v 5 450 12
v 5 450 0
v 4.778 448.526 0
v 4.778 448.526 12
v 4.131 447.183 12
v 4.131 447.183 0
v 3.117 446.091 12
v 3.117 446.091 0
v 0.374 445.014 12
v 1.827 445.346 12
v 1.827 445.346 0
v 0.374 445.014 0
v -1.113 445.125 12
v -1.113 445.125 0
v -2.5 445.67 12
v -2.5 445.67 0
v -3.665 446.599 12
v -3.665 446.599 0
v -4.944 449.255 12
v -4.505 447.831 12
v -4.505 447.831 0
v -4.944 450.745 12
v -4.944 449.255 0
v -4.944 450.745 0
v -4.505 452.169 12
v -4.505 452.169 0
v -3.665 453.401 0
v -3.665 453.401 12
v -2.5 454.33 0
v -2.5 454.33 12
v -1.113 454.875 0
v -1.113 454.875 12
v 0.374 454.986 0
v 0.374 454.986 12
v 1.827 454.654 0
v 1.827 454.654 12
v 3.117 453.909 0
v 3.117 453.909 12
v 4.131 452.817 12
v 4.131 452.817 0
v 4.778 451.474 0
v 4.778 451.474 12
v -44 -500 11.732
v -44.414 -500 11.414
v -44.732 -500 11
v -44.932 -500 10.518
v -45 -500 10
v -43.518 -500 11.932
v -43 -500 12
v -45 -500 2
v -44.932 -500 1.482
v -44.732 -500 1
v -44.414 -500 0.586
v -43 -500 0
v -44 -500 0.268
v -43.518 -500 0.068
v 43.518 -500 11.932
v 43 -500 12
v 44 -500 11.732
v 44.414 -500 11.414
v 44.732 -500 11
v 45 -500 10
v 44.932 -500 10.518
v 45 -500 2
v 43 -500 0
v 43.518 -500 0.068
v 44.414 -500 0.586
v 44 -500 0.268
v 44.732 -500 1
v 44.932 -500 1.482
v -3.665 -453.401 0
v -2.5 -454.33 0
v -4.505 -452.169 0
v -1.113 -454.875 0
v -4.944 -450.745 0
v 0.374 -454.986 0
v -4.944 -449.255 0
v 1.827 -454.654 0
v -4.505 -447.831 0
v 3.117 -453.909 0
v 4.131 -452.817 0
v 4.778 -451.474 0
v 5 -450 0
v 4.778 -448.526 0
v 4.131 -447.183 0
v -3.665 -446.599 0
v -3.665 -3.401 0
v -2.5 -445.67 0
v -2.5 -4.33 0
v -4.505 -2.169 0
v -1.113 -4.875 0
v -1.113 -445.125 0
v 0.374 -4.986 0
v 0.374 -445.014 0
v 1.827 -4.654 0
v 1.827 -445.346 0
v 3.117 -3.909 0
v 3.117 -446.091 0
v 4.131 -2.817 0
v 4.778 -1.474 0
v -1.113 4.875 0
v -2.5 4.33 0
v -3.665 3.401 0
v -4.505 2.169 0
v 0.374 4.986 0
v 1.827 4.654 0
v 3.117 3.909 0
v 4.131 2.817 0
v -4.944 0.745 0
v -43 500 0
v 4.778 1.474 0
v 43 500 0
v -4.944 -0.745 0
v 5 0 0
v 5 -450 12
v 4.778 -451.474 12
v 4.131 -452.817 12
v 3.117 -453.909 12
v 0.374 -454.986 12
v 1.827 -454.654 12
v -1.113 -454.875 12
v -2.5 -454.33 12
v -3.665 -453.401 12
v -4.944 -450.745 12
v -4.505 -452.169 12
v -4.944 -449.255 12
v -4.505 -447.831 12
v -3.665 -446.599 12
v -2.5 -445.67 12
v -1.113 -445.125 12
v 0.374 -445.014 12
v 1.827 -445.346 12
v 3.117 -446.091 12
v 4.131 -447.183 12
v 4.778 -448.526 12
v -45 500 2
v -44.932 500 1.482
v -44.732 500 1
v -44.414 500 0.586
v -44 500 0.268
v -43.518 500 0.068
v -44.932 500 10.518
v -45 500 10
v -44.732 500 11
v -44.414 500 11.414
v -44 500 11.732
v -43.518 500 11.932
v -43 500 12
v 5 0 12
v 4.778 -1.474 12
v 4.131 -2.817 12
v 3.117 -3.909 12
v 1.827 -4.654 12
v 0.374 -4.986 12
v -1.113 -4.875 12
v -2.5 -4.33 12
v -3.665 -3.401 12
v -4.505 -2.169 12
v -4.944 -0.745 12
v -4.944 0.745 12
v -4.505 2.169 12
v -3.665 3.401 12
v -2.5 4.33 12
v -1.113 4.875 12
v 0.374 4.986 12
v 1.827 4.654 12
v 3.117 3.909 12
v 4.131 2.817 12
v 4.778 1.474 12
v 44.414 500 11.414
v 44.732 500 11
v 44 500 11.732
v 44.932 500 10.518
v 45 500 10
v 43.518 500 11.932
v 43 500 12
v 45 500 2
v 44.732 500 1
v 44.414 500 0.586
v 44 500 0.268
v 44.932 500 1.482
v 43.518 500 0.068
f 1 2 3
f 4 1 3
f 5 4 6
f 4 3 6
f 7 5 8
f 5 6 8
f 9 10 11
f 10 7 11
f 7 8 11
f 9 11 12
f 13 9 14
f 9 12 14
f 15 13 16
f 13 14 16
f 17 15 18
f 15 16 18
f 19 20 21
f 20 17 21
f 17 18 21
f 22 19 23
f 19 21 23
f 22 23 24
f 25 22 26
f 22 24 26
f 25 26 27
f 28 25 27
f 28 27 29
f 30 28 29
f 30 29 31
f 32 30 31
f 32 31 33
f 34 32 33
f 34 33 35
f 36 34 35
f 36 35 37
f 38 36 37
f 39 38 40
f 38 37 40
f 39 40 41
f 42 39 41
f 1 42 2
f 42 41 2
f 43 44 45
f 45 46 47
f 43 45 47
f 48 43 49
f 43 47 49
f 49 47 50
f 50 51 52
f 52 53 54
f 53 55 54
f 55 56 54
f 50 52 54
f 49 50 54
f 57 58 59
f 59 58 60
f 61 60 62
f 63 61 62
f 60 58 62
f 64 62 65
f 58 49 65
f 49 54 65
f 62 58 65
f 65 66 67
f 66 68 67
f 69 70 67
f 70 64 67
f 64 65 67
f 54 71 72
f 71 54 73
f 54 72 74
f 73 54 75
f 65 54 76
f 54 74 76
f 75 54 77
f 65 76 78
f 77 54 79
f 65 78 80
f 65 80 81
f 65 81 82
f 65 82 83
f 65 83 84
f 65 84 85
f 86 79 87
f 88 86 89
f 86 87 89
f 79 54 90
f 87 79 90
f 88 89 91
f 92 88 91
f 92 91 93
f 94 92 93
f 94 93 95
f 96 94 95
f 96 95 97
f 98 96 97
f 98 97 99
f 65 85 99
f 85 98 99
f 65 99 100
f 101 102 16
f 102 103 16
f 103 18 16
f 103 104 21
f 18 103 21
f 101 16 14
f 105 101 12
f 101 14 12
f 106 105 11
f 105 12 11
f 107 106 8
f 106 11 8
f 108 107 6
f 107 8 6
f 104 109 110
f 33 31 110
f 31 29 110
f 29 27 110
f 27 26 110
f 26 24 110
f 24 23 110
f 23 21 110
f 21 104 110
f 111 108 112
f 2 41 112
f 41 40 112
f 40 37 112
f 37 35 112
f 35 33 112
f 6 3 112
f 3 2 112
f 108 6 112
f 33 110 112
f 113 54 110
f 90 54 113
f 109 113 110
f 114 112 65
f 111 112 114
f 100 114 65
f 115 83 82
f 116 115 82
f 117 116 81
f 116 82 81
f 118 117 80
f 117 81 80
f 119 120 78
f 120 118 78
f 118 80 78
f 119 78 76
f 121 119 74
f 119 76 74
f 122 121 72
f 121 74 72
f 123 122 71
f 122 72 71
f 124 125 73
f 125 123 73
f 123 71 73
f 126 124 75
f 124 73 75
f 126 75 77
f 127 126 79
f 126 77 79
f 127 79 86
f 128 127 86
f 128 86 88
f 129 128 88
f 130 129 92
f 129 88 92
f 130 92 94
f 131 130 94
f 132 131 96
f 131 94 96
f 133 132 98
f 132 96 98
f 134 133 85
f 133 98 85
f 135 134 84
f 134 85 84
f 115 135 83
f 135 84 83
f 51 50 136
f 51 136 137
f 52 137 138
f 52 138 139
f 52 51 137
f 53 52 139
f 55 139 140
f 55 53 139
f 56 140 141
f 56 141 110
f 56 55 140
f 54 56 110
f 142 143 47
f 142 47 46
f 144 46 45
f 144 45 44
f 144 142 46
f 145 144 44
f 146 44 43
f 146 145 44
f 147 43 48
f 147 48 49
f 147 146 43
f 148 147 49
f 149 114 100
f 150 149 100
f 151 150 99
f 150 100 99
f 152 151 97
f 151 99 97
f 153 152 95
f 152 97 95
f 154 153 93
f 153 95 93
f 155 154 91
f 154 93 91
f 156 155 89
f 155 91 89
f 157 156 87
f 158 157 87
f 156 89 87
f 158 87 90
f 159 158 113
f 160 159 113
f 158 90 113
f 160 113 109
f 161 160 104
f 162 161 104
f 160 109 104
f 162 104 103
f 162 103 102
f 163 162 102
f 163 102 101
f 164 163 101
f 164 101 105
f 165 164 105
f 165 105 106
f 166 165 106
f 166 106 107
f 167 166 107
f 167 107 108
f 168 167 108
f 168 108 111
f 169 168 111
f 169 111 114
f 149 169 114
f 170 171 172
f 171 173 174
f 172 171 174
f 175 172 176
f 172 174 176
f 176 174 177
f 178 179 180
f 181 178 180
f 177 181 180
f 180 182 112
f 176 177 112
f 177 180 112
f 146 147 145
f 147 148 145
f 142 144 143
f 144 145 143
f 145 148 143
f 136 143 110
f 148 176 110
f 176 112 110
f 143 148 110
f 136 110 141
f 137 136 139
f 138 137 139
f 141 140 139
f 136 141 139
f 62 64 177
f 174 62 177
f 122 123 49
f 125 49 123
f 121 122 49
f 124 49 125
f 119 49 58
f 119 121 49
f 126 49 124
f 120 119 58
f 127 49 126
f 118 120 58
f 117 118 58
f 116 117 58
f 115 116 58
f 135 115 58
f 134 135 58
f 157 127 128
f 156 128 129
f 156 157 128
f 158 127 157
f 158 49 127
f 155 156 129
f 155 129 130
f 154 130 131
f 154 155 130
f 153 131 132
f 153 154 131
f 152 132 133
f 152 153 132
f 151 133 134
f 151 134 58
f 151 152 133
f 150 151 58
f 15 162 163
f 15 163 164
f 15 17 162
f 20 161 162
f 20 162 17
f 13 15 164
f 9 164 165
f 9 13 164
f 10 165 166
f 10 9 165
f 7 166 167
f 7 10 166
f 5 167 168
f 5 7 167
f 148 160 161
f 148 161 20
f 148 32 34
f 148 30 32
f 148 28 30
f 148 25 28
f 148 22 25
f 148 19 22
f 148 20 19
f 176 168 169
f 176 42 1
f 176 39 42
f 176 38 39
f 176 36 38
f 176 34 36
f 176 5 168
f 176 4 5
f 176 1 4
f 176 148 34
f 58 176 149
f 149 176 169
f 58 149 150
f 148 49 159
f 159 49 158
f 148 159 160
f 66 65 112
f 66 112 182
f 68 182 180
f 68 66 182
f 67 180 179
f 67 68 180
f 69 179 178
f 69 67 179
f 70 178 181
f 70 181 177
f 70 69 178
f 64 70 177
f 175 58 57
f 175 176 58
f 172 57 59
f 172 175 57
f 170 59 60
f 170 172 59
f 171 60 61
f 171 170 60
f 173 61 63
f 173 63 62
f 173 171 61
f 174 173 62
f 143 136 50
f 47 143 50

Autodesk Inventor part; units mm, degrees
ref_plane "YZ Plane" through (0, 0, 0) normal (1, 0, 0) x (0, 1, 0)
ref_plane "XZ Plane" through (0, 0, 0) normal (0, 1, 0) x (-1, 0, 0)
ref_plane "Work Plane1" through (0, 0, 0) normal (0, 0, 1) x (1, 0, 0)
sketch "Sketch1" plane through (0, 0, 0) normal (0, 0, 1) x (1, 0, 0)
  line L0 (-45, -500) -> (45, -500)
  line L1 (45, -500) -> (45, 500)
  line L2 (45, 500) -> (-45, 500)
  line L3 (-45, 500) -> (-45, -500)
  line L4 (-385, 0) -> (385, 0) projected
  line L5 (0, -500) -> (0, 500) construction
  circle A0 centre (0, 0) radius 5
  circle A1 centre (0, -450) radius 5
  circle A2 centre (0, 450) radius 5
  circle A3 centre (240, -0.5) radius 5 construction
  circle A4 centre (120, -0.5) radius 5 construction
  circle A5 centre (-120, -0.5) radius 5 construction
  circle A6 centre (-240, -0.5) radius 5 construction
  circle A7 centre (0, -0.5) radius 5 construction
  line L6 (-275, -23) -> (275, -23) construction
  line L7 (275, 23) -> (275, -23) construction
  line L8 (275, 23) -> (-275, 23) construction
  line L9 (-275, -23) -> (-275, 23) construction
  point P0 (0, 0)
  point P1 (-45, 0)
  dimension "d0" = 90
  dimension "d1" = 1000
  dimension "d2" = 10
  dimension "d3" = 10
  dimension "d4" = 10
  dimension "d5" = 450
  dimension "d6" = 450
extrude "Extrusion1" add sketch "Sketch1" along normal blind 12 contours L3 L4 A0 L1 L0 | L3 L2 L1 L4 A0
fillet "Fillet1" radius 2 6 edges at (-45, -250, 12) (-45, 250, 12) (-45, -250, 0) (-45, 250, 0) (45, 0, 12) (45, 0, 0)
properties part number "doga_interm" material "Wood (Oak)"
